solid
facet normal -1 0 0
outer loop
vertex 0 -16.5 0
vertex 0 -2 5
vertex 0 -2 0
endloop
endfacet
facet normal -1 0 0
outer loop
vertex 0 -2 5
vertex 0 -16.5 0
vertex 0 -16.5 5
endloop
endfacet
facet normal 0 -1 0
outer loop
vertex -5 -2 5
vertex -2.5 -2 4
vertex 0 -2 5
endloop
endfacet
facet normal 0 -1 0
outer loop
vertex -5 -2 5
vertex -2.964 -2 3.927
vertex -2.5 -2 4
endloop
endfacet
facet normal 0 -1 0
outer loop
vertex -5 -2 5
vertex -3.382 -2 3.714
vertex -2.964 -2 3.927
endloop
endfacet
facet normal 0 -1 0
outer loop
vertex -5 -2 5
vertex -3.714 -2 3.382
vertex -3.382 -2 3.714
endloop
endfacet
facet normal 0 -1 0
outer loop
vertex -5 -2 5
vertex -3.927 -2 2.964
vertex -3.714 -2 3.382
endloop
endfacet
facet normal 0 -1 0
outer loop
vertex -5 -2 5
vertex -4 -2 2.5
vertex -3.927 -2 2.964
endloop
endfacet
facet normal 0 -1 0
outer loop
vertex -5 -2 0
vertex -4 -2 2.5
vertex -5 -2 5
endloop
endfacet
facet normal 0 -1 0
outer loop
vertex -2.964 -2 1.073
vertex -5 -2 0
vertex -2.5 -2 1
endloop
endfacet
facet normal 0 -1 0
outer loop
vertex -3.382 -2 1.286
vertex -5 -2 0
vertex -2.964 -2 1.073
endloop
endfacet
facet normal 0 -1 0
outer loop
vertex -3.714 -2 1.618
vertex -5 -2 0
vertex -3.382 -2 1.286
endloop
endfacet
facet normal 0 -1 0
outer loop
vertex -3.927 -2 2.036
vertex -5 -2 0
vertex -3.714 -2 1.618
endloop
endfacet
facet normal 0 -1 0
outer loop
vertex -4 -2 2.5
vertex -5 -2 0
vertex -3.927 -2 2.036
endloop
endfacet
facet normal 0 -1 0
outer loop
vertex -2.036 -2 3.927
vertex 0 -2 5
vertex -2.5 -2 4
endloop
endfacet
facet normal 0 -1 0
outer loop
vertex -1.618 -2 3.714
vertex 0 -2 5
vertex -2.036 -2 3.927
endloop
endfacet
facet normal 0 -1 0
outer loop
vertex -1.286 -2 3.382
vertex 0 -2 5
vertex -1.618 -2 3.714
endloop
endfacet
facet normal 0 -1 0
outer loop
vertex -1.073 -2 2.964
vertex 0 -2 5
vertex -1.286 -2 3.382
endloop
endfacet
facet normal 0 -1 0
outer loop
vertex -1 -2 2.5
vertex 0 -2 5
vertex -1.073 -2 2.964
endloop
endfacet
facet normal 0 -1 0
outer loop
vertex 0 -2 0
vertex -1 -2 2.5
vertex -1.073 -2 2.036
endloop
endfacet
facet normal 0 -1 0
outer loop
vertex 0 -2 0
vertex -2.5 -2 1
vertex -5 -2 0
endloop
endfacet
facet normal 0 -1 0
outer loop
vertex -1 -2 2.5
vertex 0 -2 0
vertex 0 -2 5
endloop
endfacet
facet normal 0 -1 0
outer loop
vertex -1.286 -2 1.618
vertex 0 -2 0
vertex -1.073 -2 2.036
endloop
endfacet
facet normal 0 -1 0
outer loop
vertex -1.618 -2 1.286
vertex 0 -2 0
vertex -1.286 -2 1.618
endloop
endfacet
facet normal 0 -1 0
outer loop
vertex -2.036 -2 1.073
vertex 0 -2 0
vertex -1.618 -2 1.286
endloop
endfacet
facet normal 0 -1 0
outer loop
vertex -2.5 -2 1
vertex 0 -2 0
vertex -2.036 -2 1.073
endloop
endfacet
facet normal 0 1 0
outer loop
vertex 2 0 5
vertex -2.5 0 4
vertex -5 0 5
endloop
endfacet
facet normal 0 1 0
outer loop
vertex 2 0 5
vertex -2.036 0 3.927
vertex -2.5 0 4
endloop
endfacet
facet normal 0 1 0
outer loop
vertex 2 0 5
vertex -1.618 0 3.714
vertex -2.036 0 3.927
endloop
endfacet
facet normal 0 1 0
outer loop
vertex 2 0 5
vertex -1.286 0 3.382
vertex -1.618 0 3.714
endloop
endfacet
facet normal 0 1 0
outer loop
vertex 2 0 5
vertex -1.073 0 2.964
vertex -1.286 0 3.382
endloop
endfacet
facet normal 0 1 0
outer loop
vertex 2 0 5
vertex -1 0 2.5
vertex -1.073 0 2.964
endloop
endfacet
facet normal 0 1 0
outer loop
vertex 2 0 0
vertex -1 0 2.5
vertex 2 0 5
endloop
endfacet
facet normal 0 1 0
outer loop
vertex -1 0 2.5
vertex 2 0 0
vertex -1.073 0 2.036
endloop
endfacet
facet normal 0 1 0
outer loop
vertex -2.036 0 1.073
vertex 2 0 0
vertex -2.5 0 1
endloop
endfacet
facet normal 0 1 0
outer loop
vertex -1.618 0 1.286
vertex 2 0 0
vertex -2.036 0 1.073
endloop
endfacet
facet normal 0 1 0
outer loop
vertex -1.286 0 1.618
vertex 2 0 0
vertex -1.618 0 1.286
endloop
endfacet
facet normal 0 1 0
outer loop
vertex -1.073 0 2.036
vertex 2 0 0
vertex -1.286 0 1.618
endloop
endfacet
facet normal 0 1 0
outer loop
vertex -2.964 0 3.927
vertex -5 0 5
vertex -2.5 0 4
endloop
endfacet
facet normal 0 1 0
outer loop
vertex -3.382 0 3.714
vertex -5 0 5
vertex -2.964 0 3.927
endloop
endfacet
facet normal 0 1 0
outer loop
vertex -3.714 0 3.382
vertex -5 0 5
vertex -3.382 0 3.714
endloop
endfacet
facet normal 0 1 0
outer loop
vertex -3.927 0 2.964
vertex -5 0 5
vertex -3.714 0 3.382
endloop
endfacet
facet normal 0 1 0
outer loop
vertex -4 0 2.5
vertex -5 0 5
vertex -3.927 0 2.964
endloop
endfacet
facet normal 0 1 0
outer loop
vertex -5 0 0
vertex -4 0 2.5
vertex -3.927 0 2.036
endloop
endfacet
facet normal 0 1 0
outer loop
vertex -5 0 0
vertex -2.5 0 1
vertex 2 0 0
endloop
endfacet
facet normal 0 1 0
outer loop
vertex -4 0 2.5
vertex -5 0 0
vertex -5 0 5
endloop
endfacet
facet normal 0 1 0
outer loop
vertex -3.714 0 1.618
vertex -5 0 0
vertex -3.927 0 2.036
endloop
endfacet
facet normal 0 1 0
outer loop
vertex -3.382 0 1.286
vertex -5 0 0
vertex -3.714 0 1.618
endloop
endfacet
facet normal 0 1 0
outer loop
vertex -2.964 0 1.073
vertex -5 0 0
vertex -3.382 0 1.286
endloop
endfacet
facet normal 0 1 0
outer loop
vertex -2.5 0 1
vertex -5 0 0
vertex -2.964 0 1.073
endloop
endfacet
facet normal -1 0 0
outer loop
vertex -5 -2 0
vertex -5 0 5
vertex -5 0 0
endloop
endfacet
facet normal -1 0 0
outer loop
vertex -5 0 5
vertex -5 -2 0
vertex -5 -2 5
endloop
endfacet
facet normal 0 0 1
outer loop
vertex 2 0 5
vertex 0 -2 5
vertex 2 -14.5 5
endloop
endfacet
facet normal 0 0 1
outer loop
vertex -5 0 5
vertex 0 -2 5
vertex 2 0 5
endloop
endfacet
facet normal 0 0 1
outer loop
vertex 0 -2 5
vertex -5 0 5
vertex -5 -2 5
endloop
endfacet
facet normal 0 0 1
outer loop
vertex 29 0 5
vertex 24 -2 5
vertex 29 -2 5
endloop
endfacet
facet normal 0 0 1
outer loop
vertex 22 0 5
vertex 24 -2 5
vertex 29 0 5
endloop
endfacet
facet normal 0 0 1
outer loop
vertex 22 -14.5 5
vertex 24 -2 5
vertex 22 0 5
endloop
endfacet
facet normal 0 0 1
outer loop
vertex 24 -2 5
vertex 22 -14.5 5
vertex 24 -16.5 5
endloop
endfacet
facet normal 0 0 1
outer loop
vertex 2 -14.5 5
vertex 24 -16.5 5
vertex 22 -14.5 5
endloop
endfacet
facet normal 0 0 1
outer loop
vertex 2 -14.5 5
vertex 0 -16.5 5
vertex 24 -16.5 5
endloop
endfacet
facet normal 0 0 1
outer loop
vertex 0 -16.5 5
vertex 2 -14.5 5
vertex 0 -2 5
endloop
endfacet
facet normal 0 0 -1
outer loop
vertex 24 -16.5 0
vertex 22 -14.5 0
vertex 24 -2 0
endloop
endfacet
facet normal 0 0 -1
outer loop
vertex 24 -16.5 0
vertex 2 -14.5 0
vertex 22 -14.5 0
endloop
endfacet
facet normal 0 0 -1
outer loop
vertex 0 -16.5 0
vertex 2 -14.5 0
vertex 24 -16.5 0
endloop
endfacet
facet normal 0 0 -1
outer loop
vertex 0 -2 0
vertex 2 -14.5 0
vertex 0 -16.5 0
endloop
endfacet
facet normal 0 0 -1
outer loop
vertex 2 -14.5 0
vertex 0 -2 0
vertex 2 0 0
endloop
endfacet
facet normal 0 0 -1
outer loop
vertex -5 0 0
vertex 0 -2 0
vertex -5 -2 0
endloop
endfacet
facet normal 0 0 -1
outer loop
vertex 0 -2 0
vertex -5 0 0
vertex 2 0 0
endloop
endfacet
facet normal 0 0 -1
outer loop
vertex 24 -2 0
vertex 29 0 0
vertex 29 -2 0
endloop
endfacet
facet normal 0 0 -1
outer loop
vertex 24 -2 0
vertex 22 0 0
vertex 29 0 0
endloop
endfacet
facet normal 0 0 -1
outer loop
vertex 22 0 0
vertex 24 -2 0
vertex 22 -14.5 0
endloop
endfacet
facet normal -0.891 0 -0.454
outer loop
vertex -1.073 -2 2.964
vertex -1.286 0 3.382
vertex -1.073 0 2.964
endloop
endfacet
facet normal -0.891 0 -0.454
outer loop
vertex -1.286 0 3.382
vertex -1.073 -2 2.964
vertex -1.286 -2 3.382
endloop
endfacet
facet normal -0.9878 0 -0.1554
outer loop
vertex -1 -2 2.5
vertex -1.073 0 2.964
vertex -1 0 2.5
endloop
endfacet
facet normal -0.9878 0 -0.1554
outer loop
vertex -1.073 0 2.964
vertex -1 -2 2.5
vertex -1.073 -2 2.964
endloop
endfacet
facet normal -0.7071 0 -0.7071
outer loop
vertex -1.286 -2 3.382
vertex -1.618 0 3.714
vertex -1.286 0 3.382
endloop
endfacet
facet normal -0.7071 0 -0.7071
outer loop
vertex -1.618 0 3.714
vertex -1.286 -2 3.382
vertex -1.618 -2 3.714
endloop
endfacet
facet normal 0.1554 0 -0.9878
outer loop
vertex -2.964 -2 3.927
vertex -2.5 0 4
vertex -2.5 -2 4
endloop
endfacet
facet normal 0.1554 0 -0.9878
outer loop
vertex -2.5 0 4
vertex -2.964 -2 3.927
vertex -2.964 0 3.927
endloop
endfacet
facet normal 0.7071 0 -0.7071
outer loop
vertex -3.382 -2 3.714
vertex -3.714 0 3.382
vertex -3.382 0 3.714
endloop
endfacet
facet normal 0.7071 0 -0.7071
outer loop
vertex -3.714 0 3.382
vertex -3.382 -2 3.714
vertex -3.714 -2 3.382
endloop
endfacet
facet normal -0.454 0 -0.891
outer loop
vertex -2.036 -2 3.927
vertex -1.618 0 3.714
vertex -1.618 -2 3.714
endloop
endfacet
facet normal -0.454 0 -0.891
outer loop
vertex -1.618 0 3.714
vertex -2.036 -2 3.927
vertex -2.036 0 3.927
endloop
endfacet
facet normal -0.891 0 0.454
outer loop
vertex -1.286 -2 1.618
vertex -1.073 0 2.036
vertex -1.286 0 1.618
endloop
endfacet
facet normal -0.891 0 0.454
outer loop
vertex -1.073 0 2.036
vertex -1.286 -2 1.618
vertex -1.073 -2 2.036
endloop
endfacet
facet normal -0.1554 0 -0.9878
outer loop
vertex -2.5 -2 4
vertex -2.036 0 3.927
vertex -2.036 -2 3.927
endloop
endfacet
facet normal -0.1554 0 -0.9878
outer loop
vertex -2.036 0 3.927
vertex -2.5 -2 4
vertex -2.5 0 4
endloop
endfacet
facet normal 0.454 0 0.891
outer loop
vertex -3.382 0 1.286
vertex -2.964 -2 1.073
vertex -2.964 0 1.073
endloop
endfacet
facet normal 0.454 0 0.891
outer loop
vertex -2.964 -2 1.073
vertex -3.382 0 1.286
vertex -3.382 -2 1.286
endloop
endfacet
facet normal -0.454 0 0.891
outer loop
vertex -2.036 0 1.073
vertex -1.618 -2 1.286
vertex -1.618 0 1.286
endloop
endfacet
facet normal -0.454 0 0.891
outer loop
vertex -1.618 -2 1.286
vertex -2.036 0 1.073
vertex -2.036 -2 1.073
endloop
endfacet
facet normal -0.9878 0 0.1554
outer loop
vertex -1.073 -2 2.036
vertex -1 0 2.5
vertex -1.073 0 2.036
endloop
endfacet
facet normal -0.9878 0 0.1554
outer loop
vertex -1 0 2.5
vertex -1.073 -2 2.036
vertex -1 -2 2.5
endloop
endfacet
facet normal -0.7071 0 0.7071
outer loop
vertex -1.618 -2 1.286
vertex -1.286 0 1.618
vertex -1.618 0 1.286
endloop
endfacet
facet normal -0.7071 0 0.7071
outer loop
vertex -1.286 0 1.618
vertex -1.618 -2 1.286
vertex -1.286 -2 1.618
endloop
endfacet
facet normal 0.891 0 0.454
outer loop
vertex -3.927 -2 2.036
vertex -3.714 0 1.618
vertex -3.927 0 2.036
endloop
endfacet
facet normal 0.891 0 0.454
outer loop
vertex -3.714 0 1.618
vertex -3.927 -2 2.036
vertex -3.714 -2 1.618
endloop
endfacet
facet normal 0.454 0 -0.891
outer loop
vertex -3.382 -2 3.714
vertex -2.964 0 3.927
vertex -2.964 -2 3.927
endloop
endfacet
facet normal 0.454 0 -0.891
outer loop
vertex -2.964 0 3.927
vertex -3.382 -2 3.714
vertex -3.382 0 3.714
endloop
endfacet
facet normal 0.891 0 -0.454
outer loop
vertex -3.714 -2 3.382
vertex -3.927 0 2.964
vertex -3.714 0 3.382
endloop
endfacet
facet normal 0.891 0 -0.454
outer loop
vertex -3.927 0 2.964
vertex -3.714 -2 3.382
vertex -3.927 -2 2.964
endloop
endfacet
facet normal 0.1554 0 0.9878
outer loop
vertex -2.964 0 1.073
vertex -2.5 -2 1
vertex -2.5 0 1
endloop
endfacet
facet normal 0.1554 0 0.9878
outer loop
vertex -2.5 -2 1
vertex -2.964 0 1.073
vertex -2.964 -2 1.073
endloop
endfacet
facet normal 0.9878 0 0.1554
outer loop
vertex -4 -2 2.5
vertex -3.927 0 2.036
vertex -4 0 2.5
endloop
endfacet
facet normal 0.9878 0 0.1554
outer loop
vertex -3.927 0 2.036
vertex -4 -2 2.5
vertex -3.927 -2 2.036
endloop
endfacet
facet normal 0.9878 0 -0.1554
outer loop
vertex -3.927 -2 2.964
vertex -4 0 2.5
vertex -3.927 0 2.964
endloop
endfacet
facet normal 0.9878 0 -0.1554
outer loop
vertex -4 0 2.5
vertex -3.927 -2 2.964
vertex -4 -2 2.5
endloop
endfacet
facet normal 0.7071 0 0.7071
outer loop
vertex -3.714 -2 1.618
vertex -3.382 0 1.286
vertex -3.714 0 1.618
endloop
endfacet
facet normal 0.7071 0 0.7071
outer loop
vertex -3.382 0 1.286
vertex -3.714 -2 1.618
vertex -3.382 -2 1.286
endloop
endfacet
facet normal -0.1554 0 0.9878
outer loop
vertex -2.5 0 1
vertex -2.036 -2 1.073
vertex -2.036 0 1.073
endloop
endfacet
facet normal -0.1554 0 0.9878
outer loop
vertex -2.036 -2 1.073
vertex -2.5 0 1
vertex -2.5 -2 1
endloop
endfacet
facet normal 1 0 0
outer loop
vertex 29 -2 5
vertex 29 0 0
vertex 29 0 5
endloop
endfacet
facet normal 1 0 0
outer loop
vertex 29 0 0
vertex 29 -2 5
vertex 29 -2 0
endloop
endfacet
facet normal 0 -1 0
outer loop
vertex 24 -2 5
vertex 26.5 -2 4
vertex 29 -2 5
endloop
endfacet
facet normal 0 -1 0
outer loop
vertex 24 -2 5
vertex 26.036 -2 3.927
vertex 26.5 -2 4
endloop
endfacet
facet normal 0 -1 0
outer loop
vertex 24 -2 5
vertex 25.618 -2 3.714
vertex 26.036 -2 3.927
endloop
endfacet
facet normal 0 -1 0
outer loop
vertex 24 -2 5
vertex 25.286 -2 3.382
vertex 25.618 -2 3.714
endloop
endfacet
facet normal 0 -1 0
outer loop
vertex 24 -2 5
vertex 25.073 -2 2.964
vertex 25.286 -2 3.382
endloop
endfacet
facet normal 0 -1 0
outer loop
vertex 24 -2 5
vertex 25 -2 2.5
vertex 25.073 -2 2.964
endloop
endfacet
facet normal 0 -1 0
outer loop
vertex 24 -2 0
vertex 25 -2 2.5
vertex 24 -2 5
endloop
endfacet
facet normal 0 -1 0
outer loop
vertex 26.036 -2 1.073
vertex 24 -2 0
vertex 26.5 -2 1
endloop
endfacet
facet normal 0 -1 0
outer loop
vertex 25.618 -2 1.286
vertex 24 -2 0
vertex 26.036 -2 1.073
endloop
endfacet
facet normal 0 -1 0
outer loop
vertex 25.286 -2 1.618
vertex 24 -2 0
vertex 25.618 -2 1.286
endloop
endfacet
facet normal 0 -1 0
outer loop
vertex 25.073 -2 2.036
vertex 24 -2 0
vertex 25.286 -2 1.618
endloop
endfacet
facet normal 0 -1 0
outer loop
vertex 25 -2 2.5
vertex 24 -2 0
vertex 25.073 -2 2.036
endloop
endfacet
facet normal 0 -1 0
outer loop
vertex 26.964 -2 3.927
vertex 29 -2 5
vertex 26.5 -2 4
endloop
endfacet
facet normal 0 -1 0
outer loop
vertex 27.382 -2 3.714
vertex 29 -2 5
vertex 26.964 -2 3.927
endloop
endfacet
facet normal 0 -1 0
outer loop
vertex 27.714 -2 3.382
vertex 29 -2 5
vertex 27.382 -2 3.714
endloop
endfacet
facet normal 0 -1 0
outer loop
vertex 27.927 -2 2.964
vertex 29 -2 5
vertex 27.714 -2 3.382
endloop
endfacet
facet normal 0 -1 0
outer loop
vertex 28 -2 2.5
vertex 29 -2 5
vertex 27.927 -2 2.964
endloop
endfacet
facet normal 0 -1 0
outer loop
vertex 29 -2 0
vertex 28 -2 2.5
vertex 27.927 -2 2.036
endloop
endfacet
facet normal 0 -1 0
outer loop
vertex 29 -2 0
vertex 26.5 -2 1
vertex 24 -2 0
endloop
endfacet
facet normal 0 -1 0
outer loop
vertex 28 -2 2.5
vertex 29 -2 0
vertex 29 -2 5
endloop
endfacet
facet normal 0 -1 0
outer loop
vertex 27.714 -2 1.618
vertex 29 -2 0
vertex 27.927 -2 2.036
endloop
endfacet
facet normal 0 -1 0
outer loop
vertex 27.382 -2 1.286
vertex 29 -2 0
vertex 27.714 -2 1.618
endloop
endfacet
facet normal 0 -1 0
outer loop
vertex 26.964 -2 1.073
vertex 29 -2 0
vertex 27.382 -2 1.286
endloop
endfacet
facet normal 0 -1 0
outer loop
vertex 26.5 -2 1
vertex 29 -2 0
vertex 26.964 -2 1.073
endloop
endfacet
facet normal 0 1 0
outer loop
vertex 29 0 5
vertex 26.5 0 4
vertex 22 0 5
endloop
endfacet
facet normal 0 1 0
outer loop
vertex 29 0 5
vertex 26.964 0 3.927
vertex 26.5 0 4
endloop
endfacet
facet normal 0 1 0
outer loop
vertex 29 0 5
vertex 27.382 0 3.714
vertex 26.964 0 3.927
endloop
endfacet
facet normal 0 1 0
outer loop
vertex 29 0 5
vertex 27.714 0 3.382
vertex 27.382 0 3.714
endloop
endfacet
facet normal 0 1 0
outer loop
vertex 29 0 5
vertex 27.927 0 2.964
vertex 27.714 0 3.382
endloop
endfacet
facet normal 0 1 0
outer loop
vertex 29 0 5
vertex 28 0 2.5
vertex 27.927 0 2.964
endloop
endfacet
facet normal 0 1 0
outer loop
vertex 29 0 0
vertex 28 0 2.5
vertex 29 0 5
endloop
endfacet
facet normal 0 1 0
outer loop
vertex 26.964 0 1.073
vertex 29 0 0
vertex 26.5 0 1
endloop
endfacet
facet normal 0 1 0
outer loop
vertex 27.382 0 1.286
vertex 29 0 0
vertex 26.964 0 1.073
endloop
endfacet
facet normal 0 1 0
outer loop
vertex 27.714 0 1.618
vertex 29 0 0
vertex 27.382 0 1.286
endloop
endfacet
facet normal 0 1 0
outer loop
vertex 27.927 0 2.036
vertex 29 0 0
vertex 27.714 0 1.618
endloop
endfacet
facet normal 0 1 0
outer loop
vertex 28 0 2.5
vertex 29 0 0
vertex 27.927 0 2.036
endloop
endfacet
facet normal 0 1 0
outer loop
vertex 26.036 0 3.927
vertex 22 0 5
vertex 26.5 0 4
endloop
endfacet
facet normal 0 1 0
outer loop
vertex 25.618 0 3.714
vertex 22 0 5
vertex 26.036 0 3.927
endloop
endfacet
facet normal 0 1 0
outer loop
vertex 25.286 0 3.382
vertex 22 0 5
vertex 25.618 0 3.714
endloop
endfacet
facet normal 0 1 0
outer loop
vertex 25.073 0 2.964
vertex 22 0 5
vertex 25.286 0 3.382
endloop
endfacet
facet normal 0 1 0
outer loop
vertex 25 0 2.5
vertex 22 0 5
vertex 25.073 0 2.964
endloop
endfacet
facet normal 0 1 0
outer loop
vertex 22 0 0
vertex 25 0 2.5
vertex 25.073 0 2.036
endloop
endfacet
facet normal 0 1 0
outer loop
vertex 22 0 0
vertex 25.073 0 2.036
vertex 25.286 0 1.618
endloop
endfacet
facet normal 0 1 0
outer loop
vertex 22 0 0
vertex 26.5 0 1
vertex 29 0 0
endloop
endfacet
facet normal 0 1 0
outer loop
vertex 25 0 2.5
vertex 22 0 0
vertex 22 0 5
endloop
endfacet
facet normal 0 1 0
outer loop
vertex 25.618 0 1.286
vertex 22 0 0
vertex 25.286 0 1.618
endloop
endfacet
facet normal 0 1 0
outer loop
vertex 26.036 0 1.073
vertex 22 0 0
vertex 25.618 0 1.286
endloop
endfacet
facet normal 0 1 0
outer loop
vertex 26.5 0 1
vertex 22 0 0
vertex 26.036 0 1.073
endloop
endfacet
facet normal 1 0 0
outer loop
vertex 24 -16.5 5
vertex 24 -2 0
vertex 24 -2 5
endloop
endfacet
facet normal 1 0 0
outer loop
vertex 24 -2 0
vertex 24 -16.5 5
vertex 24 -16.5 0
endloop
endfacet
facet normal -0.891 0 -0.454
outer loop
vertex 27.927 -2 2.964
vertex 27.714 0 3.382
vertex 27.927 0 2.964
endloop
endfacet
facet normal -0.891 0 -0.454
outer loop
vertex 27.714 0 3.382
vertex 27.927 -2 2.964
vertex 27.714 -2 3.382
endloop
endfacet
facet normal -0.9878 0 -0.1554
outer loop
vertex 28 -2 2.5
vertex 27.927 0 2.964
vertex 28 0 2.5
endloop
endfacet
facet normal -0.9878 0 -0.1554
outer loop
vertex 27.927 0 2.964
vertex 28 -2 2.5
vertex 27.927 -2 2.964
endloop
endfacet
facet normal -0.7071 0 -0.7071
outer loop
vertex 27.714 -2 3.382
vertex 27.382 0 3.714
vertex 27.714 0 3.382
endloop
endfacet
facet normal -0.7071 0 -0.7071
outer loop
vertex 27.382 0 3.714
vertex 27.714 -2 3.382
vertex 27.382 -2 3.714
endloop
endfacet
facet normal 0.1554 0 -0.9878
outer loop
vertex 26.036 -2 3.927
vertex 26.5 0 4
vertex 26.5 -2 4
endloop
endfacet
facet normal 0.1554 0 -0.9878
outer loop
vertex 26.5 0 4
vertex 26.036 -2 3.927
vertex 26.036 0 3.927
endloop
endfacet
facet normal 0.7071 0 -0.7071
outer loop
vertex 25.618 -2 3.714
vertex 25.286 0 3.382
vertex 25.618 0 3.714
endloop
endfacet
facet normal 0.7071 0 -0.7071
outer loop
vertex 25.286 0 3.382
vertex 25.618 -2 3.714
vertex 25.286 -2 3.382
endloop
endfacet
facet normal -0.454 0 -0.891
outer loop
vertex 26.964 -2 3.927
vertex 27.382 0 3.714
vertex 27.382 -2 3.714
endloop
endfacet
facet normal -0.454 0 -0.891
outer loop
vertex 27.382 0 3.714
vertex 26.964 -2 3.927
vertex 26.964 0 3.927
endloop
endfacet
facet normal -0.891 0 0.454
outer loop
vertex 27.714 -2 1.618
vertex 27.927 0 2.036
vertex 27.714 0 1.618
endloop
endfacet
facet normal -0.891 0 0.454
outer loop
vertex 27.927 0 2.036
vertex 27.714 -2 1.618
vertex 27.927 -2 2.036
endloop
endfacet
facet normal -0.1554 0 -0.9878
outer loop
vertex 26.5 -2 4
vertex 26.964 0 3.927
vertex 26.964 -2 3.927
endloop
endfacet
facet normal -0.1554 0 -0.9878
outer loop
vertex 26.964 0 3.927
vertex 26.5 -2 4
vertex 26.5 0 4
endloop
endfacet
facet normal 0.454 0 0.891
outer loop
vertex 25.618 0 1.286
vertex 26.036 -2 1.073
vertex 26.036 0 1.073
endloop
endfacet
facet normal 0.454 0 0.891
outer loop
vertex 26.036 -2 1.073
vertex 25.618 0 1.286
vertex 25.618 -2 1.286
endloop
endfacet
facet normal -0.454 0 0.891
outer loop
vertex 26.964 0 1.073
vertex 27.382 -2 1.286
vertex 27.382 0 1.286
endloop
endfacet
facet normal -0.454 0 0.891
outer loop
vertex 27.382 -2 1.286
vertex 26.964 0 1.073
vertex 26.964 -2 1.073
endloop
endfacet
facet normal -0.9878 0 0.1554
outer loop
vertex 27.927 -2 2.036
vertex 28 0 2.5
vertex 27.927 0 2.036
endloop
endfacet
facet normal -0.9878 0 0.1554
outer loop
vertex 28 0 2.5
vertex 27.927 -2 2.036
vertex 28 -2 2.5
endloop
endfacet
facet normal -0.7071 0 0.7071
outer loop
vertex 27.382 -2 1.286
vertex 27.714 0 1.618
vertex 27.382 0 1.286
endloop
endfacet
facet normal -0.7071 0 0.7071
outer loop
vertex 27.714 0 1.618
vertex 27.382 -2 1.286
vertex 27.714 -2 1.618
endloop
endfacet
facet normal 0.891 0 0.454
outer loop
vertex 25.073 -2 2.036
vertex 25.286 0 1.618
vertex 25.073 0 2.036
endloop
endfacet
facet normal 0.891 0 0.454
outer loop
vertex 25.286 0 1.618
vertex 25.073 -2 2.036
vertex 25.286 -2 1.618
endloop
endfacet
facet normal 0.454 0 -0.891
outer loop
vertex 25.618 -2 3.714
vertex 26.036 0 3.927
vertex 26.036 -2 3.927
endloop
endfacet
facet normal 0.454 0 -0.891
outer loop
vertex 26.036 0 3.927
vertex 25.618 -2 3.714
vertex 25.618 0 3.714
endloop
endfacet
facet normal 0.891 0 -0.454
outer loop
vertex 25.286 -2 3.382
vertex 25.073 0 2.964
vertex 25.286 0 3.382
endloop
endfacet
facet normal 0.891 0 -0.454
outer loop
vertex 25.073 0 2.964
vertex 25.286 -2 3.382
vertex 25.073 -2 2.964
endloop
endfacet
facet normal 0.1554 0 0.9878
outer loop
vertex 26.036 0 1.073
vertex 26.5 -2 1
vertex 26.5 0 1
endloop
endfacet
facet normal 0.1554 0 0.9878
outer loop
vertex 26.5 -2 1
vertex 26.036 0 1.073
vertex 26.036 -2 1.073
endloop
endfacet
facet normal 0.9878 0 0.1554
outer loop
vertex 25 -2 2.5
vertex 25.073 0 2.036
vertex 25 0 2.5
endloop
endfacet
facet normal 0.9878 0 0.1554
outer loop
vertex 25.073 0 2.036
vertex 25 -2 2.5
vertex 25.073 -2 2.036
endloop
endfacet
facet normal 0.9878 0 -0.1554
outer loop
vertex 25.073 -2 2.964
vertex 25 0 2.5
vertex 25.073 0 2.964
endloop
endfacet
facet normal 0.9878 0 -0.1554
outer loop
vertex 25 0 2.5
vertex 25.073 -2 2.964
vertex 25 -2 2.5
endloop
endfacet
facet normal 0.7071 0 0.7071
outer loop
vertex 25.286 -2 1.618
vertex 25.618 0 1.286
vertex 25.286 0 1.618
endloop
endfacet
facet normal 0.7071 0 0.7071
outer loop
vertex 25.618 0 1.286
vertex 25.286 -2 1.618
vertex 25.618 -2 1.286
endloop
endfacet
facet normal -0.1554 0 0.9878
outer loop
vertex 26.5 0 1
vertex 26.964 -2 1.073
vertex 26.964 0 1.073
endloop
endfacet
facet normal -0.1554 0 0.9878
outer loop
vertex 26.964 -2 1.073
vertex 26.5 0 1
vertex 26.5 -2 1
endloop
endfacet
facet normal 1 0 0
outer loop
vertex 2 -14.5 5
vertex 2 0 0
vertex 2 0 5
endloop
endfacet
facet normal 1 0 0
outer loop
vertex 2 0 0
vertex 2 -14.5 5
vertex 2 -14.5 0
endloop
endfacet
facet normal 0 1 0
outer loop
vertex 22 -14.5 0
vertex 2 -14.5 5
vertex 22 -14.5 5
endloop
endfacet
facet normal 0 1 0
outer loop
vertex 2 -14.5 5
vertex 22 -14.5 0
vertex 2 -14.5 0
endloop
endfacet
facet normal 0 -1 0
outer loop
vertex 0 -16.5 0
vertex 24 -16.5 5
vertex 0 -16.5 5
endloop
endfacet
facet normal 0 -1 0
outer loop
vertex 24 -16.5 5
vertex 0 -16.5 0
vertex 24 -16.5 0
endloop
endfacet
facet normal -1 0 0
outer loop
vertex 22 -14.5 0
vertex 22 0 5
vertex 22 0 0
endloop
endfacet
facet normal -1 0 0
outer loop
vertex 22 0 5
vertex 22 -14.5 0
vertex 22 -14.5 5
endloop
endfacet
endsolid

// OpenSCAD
$fn=20;
rotate([90,0,0])union() {
	cube ([2,5,14.5]);
	translate([-5,0,0]) difference() {
		cube([5,5,2]);
		translate([2.5,2.5,0]) cylinder(d=3,h=2);
	}
	translate([0,0,14.5]) cube([24,5,2]);
	translate([22,0,0]) cube([2,5,14.5]);
	translate([24,0,0]) difference() {
		cube([5,5,2]);
		translate([2.5,2.5,0]) cylinder(d=3,h=2);
	}
}
